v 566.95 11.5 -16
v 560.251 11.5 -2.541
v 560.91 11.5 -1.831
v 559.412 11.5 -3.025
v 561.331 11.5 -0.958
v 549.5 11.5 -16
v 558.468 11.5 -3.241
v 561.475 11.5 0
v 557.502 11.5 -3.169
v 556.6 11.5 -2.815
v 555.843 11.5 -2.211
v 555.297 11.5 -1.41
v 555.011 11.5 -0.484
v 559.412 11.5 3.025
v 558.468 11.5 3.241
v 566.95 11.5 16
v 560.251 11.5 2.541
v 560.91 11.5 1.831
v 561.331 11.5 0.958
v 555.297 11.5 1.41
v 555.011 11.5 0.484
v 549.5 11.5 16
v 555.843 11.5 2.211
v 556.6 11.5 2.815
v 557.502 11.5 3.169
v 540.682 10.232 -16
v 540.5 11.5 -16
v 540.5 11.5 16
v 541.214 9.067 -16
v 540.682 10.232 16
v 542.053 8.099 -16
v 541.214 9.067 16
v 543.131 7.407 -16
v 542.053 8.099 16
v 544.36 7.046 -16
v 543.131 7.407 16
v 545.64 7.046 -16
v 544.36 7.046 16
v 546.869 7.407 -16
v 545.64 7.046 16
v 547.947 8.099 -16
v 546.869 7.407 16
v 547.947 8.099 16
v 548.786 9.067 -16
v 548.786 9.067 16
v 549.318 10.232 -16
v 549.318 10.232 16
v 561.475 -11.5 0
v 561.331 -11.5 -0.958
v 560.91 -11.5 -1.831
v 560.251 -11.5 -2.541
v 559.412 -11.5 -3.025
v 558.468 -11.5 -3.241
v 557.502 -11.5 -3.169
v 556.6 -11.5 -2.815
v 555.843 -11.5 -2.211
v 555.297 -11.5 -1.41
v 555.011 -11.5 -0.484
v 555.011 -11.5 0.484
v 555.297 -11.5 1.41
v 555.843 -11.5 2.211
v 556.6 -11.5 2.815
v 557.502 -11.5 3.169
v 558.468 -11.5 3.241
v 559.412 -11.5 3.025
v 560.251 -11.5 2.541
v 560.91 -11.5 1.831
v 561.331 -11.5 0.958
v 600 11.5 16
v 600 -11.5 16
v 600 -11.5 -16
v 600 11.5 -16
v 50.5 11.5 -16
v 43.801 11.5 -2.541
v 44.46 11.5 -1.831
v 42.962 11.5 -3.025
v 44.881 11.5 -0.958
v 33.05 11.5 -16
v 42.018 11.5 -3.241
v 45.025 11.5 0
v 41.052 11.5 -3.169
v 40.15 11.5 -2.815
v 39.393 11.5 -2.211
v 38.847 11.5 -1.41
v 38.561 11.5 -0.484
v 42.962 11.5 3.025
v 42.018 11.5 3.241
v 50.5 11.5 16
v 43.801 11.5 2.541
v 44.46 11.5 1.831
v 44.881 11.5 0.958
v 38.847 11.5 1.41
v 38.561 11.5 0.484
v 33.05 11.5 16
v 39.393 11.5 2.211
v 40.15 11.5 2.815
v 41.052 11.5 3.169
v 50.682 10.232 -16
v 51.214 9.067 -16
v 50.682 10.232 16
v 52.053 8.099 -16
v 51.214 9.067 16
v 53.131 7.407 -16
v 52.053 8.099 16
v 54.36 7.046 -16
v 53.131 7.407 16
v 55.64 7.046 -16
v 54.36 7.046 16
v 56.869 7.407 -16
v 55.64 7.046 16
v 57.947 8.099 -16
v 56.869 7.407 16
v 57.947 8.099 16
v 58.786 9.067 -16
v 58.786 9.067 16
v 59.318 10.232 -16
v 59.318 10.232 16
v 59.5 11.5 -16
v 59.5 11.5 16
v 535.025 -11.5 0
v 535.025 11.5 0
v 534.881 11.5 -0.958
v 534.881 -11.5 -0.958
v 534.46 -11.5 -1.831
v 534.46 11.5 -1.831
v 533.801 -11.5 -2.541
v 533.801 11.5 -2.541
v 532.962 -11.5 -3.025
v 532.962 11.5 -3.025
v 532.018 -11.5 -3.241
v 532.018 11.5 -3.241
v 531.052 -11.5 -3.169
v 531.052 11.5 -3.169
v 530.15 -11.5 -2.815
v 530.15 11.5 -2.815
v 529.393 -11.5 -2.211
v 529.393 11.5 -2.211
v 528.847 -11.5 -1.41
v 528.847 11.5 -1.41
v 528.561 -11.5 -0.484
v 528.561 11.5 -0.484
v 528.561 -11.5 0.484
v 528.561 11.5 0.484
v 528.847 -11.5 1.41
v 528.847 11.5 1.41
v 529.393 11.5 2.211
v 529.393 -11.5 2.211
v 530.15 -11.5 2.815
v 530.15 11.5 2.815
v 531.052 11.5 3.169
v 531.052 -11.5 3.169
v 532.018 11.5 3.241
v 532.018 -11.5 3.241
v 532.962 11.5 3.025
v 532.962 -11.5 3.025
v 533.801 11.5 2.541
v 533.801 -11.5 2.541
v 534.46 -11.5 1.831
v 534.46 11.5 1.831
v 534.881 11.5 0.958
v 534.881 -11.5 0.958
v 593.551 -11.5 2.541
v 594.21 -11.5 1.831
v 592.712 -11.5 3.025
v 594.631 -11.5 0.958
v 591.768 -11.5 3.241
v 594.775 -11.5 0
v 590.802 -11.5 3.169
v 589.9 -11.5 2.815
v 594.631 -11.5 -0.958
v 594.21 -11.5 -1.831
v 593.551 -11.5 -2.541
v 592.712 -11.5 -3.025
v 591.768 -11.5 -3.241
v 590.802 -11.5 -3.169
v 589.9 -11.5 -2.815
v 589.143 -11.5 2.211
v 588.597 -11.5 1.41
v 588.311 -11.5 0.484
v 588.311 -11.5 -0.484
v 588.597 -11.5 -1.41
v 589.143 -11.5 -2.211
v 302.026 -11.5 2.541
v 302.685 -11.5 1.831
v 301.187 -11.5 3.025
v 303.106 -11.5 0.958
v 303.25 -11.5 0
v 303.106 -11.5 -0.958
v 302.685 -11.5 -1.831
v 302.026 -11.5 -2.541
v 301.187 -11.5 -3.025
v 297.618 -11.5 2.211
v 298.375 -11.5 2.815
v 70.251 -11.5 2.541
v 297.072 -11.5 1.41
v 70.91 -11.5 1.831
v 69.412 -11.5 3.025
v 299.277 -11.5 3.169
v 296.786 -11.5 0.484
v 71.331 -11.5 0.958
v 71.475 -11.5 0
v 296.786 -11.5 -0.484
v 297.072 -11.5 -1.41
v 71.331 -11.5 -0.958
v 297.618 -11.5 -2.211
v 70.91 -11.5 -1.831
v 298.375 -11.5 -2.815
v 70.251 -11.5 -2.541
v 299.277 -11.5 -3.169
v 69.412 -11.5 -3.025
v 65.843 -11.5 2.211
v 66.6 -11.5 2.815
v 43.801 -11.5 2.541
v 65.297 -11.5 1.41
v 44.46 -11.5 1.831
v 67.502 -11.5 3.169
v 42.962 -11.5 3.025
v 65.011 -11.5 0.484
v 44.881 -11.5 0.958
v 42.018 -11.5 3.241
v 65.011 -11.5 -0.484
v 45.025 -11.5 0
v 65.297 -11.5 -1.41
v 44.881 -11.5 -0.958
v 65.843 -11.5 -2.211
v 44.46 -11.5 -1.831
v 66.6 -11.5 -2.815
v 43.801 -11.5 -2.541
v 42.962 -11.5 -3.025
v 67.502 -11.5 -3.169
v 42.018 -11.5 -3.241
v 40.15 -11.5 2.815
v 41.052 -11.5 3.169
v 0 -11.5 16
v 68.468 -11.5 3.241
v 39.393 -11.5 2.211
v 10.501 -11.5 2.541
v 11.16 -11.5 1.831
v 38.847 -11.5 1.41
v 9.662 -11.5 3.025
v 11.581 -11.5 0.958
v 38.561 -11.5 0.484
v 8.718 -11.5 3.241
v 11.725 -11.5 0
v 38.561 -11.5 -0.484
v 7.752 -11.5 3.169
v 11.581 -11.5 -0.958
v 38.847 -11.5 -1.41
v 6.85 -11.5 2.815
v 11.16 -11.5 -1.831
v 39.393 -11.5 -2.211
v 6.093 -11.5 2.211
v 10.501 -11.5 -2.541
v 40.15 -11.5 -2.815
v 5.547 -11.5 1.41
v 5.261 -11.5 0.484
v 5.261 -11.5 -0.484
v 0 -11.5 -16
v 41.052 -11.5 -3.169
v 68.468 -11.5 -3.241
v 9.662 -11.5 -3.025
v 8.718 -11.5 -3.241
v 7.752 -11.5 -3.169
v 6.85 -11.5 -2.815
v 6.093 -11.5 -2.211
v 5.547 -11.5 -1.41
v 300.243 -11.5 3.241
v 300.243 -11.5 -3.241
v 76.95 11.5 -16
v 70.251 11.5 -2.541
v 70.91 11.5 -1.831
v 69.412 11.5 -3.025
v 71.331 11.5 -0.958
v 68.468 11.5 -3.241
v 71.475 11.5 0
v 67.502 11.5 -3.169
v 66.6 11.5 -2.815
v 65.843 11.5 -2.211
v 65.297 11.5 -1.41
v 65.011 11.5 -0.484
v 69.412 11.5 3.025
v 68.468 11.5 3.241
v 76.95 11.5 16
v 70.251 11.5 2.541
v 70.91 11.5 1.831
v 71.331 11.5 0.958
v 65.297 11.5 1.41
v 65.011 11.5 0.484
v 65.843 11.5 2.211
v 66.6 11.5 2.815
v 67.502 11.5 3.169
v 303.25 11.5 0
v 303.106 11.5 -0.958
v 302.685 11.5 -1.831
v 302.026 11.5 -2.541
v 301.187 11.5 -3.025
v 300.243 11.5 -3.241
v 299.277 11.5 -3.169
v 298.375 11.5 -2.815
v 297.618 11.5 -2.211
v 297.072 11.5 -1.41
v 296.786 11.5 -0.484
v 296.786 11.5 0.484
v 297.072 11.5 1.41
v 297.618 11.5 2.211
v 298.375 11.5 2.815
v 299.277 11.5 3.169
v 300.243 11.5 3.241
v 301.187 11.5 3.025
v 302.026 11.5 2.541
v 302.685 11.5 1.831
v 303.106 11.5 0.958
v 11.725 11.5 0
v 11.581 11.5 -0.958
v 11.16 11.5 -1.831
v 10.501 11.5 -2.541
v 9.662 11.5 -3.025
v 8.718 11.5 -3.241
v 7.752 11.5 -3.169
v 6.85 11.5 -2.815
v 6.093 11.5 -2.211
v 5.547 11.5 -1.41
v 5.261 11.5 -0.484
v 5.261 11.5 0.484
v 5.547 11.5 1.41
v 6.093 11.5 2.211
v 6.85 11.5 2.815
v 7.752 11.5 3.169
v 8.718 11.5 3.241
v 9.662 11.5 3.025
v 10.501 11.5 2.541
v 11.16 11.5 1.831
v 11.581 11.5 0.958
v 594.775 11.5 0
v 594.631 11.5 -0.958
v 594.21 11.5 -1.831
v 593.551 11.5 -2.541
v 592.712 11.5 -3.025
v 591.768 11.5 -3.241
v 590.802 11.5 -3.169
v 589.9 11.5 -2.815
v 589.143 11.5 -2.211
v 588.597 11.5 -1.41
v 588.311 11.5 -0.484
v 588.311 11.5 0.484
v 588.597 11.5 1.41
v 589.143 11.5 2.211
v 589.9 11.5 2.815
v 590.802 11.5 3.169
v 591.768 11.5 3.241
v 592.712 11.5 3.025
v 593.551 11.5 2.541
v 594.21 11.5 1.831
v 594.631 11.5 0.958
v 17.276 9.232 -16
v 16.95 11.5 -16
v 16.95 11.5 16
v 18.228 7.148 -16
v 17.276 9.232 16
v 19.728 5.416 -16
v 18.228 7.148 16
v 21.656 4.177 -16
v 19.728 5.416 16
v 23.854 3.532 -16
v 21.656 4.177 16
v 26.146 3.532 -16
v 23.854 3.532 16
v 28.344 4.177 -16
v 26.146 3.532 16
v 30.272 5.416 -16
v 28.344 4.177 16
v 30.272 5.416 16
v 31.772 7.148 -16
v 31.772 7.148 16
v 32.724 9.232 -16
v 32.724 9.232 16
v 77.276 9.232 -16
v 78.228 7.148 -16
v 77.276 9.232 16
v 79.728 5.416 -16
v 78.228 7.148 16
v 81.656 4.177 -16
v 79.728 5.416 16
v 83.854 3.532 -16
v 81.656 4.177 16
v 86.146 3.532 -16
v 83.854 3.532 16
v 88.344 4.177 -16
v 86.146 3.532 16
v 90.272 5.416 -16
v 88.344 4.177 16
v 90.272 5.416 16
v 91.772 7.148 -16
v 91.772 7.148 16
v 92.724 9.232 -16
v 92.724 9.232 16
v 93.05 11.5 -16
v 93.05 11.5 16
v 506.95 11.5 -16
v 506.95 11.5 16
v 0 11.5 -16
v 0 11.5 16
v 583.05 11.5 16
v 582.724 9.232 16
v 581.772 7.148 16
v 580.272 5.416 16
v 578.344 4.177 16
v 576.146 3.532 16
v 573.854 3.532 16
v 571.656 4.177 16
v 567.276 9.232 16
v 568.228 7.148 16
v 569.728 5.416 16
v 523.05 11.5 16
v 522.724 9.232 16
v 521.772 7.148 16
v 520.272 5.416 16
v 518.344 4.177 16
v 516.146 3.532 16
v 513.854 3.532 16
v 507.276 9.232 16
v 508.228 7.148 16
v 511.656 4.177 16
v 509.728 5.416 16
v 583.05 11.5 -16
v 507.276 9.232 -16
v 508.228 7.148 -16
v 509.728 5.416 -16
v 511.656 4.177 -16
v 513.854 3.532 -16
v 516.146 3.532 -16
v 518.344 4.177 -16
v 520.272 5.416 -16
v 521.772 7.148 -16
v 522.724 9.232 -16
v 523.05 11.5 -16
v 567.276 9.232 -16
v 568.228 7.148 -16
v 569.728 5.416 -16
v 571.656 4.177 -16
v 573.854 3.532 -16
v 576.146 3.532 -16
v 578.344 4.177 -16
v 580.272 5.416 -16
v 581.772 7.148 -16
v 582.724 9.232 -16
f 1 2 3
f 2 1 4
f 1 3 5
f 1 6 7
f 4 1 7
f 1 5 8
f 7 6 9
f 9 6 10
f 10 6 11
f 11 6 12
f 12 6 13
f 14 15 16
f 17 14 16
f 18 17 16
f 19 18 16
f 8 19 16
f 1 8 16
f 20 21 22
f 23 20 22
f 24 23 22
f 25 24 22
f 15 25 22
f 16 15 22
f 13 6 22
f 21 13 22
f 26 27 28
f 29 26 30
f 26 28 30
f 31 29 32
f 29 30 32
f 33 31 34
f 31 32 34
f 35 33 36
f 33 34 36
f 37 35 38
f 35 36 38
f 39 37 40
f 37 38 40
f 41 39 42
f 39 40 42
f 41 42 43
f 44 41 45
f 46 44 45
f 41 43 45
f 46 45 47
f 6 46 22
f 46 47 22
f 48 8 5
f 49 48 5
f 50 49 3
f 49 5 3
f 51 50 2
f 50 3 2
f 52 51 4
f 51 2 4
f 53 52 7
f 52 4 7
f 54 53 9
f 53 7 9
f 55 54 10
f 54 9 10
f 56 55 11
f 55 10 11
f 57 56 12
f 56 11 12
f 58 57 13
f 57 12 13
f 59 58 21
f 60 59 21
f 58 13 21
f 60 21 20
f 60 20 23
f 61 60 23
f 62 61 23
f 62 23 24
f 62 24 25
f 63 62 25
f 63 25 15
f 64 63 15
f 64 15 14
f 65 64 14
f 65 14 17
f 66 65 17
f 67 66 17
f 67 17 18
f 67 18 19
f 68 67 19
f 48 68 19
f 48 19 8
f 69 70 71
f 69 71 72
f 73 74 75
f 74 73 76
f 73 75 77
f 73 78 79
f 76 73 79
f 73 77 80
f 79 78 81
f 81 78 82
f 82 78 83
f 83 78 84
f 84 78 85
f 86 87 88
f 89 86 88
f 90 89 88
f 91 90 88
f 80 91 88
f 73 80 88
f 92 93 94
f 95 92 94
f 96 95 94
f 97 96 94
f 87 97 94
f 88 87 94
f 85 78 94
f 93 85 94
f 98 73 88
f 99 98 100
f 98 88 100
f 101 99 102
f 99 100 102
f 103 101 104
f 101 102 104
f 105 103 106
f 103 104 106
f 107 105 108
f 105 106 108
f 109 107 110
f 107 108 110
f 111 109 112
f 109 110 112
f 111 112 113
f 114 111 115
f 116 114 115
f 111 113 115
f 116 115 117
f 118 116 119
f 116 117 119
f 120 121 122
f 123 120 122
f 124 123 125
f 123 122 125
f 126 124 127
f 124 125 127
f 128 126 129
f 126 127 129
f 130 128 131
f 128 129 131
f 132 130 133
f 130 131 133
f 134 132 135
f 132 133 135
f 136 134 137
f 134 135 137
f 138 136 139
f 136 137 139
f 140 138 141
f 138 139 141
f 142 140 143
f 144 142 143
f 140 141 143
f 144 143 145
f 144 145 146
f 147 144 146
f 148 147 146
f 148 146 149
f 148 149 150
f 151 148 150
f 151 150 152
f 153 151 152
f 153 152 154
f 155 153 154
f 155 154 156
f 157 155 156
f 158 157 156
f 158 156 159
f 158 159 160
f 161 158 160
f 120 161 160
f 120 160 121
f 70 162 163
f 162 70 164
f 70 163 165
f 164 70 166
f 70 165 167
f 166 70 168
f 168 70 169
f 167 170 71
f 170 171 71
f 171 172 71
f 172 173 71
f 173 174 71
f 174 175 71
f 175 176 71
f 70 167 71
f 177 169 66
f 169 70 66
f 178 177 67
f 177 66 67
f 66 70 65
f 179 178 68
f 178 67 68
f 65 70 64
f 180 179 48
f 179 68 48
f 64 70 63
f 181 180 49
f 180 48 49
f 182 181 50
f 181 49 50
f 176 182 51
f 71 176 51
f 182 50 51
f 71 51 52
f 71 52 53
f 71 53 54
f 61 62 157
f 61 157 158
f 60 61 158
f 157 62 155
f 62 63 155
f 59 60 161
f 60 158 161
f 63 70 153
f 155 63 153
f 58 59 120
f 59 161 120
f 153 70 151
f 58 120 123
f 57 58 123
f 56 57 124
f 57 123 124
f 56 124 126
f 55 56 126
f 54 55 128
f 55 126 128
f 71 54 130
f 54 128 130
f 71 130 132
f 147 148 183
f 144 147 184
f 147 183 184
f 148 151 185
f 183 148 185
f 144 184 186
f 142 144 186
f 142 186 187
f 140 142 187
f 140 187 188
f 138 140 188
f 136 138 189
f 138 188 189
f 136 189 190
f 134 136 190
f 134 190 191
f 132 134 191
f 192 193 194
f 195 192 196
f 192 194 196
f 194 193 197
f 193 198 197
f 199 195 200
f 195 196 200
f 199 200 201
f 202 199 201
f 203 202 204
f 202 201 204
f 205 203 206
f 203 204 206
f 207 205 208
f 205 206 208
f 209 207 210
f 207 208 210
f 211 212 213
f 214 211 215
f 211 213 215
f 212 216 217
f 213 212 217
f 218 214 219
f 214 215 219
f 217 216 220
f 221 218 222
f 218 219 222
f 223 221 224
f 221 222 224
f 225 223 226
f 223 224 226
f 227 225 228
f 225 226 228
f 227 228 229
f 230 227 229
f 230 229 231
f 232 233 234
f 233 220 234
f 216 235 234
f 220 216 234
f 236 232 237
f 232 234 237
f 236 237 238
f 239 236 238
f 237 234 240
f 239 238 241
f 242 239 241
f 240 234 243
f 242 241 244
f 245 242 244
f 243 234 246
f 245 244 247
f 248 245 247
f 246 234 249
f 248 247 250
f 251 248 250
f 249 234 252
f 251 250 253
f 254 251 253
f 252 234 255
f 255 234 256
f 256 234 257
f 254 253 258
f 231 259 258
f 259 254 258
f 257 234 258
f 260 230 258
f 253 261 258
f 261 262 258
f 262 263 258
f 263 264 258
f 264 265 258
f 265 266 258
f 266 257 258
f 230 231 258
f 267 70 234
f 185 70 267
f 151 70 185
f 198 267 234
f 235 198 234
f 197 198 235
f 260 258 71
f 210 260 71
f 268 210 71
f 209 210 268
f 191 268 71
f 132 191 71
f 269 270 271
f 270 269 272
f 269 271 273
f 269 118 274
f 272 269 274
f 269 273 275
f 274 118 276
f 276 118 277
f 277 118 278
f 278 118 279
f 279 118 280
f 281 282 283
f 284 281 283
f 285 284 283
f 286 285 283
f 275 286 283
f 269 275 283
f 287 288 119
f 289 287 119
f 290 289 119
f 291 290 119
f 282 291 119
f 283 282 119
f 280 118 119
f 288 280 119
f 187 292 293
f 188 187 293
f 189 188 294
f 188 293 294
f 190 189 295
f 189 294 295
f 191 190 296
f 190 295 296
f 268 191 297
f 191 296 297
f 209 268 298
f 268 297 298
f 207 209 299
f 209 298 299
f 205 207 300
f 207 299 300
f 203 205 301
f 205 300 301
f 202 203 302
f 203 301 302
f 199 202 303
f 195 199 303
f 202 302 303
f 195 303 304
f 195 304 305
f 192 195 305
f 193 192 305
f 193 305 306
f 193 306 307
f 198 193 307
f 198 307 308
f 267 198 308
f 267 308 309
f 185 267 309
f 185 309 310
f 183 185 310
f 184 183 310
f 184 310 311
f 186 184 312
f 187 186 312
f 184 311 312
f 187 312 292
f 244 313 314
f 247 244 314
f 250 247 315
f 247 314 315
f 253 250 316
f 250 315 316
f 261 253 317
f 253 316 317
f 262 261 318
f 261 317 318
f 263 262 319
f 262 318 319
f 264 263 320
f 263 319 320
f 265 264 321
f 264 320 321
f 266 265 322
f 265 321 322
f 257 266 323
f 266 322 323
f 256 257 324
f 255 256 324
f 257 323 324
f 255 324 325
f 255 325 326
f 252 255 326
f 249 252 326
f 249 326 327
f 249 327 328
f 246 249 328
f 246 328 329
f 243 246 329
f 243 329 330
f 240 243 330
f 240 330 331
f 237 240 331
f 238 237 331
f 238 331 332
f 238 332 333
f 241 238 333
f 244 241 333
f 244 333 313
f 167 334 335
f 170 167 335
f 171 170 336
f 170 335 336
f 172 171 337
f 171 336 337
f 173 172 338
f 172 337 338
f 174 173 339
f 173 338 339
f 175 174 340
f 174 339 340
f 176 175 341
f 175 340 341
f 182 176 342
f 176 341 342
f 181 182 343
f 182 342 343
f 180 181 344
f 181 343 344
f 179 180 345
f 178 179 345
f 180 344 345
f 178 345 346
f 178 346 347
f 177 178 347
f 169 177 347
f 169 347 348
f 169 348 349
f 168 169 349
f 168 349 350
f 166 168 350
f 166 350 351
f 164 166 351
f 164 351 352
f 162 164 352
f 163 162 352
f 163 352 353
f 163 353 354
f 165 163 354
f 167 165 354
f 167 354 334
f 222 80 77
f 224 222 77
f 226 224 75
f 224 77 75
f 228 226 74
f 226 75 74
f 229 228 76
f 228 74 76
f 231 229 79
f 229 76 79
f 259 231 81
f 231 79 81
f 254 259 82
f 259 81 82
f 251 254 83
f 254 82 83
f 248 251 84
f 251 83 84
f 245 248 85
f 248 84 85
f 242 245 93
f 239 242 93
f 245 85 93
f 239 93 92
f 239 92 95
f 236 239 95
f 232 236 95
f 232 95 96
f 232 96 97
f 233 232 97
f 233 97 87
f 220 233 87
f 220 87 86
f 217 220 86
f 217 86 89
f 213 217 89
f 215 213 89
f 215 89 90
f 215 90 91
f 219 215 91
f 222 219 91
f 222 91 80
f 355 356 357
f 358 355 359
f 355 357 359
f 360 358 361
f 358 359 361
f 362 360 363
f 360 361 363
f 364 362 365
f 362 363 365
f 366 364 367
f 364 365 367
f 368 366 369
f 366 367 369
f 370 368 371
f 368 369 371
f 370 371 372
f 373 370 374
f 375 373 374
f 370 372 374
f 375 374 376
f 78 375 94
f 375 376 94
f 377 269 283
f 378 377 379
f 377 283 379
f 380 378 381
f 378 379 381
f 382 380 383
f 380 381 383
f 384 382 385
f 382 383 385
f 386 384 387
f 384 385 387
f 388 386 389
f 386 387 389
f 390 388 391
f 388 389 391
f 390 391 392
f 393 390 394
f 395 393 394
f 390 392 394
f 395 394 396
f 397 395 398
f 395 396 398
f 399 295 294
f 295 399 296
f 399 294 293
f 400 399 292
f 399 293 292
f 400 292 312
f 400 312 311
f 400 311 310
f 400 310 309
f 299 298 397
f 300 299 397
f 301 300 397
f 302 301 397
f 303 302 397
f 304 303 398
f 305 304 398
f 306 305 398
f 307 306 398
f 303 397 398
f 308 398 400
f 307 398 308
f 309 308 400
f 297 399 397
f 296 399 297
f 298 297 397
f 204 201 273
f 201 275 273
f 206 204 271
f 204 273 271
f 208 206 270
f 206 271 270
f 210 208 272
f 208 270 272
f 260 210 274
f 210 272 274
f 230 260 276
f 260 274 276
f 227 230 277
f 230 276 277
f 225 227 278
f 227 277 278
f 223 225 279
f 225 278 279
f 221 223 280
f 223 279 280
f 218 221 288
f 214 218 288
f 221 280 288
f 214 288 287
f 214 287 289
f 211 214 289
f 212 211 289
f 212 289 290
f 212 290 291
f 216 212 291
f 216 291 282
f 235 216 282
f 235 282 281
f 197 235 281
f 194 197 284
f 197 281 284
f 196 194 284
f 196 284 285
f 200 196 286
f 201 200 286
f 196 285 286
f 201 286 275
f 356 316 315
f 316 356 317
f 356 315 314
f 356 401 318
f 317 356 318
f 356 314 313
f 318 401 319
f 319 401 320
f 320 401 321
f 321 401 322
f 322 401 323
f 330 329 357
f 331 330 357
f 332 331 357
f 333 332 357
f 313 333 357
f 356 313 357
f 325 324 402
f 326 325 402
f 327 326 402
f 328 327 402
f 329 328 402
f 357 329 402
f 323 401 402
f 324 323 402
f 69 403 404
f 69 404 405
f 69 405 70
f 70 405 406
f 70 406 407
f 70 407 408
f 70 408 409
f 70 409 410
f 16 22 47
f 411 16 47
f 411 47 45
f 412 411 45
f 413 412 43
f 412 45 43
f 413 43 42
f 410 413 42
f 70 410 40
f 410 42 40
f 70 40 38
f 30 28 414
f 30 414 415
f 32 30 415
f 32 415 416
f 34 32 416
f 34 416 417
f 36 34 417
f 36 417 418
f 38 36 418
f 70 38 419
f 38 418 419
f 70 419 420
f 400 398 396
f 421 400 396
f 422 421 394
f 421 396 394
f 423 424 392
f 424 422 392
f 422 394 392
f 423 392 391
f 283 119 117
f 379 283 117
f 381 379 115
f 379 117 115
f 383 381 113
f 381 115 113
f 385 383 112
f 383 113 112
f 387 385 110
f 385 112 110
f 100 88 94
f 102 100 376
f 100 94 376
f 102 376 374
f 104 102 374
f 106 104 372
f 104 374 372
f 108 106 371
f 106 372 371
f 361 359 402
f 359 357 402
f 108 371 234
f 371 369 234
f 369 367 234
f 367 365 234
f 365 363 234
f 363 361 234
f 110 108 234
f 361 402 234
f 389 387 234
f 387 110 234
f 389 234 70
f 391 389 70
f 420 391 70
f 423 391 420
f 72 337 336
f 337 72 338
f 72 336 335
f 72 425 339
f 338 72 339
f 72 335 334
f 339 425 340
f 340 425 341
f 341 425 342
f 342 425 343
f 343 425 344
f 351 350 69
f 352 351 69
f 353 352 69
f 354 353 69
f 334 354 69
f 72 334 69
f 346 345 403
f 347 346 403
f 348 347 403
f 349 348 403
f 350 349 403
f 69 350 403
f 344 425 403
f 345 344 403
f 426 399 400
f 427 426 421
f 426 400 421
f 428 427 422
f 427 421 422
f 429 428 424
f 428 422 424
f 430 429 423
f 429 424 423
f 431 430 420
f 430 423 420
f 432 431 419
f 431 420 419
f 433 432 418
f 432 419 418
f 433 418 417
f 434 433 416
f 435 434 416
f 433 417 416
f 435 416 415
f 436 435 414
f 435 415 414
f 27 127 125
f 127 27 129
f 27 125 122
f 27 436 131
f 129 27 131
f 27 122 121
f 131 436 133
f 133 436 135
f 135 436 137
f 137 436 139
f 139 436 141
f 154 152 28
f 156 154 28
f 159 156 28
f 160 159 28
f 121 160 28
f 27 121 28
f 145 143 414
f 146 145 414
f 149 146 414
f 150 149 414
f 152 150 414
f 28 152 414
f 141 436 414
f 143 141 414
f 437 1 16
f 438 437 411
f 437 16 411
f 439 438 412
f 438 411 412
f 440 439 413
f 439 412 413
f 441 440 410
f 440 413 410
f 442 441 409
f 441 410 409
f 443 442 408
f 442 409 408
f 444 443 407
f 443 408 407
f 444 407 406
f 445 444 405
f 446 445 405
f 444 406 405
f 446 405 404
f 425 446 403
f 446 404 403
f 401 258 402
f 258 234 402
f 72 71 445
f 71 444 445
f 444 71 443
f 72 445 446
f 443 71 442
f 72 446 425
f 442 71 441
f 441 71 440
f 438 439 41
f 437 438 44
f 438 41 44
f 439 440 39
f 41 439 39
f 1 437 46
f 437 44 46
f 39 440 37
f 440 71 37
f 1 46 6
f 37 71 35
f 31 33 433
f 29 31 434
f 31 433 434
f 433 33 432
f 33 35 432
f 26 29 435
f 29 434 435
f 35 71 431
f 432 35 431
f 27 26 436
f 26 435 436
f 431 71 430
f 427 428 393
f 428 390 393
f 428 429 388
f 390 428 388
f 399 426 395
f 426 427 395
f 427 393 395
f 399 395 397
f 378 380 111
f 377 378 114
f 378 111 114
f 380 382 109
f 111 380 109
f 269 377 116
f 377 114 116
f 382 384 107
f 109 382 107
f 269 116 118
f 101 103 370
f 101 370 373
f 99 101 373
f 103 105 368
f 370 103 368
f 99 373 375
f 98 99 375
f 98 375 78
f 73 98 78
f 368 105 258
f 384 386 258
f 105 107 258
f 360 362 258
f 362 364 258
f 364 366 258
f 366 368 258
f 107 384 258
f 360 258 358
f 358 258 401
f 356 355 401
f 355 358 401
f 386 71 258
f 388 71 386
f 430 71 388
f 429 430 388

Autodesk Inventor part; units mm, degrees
ref_plane "YZ Plane" through (0, 0, 0) normal (1, 0, 0) x (0, 1, 0)
ref_plane "XZ Plane" through (0, 0, 0) normal (0, 1, 0) x (-1, 0, 0)
ref_plane "XY Plane" through (0, 0, 0) normal (0, 0, 1) x (1, 0, 0)
sketch "Sketch1" plane through (0, 0, 0) normal (1, 0, 0) x (0, 1, 0)
  point P0 (0, 0)
sketch "Sketch2" plane through (0, 0, 0) normal (1, 0, 0) x (0, 1, 0)
  line L0 (11.5, 16) -> (-11.5, 16)
  line L1 (-11.5, 16) -> (-11.5, -16)
  line L2 (-11.5, -16) -> (11.5, -16)
  line L3 (11.5, -16) -> (11.5, 16)
  point P0 (0, 0)
  point P1 (11.5, 0)
  point P2 (0, 16)
  dimension "d0" = 32
  dimension "d1" = 23
extrude "Extrusion1" add sketch "Sketch2" along normal blind 600
sketch "Sketch3" plane through (0, -11.5, 16) normal (0, 0, 1) x (1, 0, 0)
  line L0 (0, 23) -> (0, 0) projected
  line L1 (0, 0) -> (600, 0) projected
  line L2 (600, 23) -> (600, 0) projected
  line L3 (0, 23) -> (600, 23) projected
  line L4 (0, 23) -> (600, 23) projected
  circle A0 centre (25, 23) radius 8.05
  circle A1 centre (85, 23) radius 8.05
  circle A2 centre (55, 23) radius 4.5
  line L5 (300, 23) -> (300, 0) construction
  circle A3 centre (575, 23) radius 8.05
  circle A4 centre (515, 23) radius 8.05
  circle A5 centre (545, 23) radius 4.5
  point P0 (0, 11.5)
  dimension "d4" = 60
  dimension "d5" = 30
  dimension "d6" = 16.1
  dimension "d7" = 25
  dimension "d8" = 9
extrude "Extrusion2" cut sketch "Sketch3" against normal through all contours A0 L3 | L3 A0 | A2 L3 | L3 A2 | A3 L3 | L3 A3 | A1 L3 | L3 A1 | A5 L3 | L3 A5 | A4 L3 | L3 A4
sketch "Sketch4" plane through (93.05, 11.5, -16) normal (0, 1, 0) x (1, 0, 0)
  line L0 (413.9, -32) -> (413.9, 0)
  line L1 (0, 0) -> (413.9, 0)
  line L2 (0, 0) -> (0, -32)
  line L3 (0, -32) -> (413.9, -32)
  line L4 (-16.1, -32) -> (-16.1, 0)
  line L5 (-33.55, 0) -> (-16.1, 0)
  line L6 (-33.55, 0) -> (-33.55, -32)
  line L7 (-33.55, -32) -> (-16.1, -32)
  line L8 (-42.55, -32) -> (-42.55, 0)
  line L9 (-60, 0) -> (-42.55, 0)
  line L10 (-60, 0) -> (-60, -32)
  line L11 (-60, -32) -> (-42.55, -32)
  line L12 (-76.1, -32) -> (-76.1, 0)
  line L13 (-93.05, 0) -> (-76.1, 0)
  line L14 (-93.05, 0) -> (-93.05, -32)
  line L15 (-93.05, -32) -> (-76.1, -32)
  line L16 (430, 0) -> (430, -32)
  line L17 (430, -32) -> (447.45, -32)
  line L18 (447.45, -32) -> (447.45, 0)
  line L19 (430, 0) -> (447.45, 0)
  line L20 (456.45, 0) -> (456.45, -32)
  line L21 (456.45, -32) -> (473.9, -32)
  line L22 (473.9, -32) -> (473.9, 0)
  line L23 (456.45, 0) -> (473.9, 0)
  line L24 (490, 0) -> (490, -32)
  line L25 (490, -32) -> (506.95, -32)
  line L26 (506.95, 0) -> (506.95, -32)
  line L27 (490, 0) -> (506.95, 0)
  line L28 (506.95, 0) -> (506.95, -32) construction
  line L29 (506.95, -16) -> (-93.05, -16) construction
  line L30 (-93.05, 0) -> (506.95, 0) construction
  line L31 (206.95, 0) -> (206.95, -32) construction
  circle A0 centre (498.475, -16) radius 3.25
  circle A1 centre (465.175, -16) radius 3.25
  circle A2 centre (438.725, -16) radius 3.25
  circle A3 centre (206.95, -16) radius 3.25
  circle A4 centre (-24.825, -16) radius 3.25
  circle A5 centre (-51.275, -16) radius 3.25
  circle A6 centre (-84.575, -16) radius 3.25
  point P0 (438.725, 0)
  point P1 (465.175, 0)
  point P2 (498.475, 0)
  point P3 (-84.575, 0)
  point P4 (-51.275, 0)
  point P5 (-24.825, 0)
extrude "Extrusion3" cut sketch "Sketch4" against normal through all contours A0 | A1 | A2 | A3 | A4 | A5 | A6
properties part number "X_STRUCTURAL_SUP" material "Wood (Birch)"
